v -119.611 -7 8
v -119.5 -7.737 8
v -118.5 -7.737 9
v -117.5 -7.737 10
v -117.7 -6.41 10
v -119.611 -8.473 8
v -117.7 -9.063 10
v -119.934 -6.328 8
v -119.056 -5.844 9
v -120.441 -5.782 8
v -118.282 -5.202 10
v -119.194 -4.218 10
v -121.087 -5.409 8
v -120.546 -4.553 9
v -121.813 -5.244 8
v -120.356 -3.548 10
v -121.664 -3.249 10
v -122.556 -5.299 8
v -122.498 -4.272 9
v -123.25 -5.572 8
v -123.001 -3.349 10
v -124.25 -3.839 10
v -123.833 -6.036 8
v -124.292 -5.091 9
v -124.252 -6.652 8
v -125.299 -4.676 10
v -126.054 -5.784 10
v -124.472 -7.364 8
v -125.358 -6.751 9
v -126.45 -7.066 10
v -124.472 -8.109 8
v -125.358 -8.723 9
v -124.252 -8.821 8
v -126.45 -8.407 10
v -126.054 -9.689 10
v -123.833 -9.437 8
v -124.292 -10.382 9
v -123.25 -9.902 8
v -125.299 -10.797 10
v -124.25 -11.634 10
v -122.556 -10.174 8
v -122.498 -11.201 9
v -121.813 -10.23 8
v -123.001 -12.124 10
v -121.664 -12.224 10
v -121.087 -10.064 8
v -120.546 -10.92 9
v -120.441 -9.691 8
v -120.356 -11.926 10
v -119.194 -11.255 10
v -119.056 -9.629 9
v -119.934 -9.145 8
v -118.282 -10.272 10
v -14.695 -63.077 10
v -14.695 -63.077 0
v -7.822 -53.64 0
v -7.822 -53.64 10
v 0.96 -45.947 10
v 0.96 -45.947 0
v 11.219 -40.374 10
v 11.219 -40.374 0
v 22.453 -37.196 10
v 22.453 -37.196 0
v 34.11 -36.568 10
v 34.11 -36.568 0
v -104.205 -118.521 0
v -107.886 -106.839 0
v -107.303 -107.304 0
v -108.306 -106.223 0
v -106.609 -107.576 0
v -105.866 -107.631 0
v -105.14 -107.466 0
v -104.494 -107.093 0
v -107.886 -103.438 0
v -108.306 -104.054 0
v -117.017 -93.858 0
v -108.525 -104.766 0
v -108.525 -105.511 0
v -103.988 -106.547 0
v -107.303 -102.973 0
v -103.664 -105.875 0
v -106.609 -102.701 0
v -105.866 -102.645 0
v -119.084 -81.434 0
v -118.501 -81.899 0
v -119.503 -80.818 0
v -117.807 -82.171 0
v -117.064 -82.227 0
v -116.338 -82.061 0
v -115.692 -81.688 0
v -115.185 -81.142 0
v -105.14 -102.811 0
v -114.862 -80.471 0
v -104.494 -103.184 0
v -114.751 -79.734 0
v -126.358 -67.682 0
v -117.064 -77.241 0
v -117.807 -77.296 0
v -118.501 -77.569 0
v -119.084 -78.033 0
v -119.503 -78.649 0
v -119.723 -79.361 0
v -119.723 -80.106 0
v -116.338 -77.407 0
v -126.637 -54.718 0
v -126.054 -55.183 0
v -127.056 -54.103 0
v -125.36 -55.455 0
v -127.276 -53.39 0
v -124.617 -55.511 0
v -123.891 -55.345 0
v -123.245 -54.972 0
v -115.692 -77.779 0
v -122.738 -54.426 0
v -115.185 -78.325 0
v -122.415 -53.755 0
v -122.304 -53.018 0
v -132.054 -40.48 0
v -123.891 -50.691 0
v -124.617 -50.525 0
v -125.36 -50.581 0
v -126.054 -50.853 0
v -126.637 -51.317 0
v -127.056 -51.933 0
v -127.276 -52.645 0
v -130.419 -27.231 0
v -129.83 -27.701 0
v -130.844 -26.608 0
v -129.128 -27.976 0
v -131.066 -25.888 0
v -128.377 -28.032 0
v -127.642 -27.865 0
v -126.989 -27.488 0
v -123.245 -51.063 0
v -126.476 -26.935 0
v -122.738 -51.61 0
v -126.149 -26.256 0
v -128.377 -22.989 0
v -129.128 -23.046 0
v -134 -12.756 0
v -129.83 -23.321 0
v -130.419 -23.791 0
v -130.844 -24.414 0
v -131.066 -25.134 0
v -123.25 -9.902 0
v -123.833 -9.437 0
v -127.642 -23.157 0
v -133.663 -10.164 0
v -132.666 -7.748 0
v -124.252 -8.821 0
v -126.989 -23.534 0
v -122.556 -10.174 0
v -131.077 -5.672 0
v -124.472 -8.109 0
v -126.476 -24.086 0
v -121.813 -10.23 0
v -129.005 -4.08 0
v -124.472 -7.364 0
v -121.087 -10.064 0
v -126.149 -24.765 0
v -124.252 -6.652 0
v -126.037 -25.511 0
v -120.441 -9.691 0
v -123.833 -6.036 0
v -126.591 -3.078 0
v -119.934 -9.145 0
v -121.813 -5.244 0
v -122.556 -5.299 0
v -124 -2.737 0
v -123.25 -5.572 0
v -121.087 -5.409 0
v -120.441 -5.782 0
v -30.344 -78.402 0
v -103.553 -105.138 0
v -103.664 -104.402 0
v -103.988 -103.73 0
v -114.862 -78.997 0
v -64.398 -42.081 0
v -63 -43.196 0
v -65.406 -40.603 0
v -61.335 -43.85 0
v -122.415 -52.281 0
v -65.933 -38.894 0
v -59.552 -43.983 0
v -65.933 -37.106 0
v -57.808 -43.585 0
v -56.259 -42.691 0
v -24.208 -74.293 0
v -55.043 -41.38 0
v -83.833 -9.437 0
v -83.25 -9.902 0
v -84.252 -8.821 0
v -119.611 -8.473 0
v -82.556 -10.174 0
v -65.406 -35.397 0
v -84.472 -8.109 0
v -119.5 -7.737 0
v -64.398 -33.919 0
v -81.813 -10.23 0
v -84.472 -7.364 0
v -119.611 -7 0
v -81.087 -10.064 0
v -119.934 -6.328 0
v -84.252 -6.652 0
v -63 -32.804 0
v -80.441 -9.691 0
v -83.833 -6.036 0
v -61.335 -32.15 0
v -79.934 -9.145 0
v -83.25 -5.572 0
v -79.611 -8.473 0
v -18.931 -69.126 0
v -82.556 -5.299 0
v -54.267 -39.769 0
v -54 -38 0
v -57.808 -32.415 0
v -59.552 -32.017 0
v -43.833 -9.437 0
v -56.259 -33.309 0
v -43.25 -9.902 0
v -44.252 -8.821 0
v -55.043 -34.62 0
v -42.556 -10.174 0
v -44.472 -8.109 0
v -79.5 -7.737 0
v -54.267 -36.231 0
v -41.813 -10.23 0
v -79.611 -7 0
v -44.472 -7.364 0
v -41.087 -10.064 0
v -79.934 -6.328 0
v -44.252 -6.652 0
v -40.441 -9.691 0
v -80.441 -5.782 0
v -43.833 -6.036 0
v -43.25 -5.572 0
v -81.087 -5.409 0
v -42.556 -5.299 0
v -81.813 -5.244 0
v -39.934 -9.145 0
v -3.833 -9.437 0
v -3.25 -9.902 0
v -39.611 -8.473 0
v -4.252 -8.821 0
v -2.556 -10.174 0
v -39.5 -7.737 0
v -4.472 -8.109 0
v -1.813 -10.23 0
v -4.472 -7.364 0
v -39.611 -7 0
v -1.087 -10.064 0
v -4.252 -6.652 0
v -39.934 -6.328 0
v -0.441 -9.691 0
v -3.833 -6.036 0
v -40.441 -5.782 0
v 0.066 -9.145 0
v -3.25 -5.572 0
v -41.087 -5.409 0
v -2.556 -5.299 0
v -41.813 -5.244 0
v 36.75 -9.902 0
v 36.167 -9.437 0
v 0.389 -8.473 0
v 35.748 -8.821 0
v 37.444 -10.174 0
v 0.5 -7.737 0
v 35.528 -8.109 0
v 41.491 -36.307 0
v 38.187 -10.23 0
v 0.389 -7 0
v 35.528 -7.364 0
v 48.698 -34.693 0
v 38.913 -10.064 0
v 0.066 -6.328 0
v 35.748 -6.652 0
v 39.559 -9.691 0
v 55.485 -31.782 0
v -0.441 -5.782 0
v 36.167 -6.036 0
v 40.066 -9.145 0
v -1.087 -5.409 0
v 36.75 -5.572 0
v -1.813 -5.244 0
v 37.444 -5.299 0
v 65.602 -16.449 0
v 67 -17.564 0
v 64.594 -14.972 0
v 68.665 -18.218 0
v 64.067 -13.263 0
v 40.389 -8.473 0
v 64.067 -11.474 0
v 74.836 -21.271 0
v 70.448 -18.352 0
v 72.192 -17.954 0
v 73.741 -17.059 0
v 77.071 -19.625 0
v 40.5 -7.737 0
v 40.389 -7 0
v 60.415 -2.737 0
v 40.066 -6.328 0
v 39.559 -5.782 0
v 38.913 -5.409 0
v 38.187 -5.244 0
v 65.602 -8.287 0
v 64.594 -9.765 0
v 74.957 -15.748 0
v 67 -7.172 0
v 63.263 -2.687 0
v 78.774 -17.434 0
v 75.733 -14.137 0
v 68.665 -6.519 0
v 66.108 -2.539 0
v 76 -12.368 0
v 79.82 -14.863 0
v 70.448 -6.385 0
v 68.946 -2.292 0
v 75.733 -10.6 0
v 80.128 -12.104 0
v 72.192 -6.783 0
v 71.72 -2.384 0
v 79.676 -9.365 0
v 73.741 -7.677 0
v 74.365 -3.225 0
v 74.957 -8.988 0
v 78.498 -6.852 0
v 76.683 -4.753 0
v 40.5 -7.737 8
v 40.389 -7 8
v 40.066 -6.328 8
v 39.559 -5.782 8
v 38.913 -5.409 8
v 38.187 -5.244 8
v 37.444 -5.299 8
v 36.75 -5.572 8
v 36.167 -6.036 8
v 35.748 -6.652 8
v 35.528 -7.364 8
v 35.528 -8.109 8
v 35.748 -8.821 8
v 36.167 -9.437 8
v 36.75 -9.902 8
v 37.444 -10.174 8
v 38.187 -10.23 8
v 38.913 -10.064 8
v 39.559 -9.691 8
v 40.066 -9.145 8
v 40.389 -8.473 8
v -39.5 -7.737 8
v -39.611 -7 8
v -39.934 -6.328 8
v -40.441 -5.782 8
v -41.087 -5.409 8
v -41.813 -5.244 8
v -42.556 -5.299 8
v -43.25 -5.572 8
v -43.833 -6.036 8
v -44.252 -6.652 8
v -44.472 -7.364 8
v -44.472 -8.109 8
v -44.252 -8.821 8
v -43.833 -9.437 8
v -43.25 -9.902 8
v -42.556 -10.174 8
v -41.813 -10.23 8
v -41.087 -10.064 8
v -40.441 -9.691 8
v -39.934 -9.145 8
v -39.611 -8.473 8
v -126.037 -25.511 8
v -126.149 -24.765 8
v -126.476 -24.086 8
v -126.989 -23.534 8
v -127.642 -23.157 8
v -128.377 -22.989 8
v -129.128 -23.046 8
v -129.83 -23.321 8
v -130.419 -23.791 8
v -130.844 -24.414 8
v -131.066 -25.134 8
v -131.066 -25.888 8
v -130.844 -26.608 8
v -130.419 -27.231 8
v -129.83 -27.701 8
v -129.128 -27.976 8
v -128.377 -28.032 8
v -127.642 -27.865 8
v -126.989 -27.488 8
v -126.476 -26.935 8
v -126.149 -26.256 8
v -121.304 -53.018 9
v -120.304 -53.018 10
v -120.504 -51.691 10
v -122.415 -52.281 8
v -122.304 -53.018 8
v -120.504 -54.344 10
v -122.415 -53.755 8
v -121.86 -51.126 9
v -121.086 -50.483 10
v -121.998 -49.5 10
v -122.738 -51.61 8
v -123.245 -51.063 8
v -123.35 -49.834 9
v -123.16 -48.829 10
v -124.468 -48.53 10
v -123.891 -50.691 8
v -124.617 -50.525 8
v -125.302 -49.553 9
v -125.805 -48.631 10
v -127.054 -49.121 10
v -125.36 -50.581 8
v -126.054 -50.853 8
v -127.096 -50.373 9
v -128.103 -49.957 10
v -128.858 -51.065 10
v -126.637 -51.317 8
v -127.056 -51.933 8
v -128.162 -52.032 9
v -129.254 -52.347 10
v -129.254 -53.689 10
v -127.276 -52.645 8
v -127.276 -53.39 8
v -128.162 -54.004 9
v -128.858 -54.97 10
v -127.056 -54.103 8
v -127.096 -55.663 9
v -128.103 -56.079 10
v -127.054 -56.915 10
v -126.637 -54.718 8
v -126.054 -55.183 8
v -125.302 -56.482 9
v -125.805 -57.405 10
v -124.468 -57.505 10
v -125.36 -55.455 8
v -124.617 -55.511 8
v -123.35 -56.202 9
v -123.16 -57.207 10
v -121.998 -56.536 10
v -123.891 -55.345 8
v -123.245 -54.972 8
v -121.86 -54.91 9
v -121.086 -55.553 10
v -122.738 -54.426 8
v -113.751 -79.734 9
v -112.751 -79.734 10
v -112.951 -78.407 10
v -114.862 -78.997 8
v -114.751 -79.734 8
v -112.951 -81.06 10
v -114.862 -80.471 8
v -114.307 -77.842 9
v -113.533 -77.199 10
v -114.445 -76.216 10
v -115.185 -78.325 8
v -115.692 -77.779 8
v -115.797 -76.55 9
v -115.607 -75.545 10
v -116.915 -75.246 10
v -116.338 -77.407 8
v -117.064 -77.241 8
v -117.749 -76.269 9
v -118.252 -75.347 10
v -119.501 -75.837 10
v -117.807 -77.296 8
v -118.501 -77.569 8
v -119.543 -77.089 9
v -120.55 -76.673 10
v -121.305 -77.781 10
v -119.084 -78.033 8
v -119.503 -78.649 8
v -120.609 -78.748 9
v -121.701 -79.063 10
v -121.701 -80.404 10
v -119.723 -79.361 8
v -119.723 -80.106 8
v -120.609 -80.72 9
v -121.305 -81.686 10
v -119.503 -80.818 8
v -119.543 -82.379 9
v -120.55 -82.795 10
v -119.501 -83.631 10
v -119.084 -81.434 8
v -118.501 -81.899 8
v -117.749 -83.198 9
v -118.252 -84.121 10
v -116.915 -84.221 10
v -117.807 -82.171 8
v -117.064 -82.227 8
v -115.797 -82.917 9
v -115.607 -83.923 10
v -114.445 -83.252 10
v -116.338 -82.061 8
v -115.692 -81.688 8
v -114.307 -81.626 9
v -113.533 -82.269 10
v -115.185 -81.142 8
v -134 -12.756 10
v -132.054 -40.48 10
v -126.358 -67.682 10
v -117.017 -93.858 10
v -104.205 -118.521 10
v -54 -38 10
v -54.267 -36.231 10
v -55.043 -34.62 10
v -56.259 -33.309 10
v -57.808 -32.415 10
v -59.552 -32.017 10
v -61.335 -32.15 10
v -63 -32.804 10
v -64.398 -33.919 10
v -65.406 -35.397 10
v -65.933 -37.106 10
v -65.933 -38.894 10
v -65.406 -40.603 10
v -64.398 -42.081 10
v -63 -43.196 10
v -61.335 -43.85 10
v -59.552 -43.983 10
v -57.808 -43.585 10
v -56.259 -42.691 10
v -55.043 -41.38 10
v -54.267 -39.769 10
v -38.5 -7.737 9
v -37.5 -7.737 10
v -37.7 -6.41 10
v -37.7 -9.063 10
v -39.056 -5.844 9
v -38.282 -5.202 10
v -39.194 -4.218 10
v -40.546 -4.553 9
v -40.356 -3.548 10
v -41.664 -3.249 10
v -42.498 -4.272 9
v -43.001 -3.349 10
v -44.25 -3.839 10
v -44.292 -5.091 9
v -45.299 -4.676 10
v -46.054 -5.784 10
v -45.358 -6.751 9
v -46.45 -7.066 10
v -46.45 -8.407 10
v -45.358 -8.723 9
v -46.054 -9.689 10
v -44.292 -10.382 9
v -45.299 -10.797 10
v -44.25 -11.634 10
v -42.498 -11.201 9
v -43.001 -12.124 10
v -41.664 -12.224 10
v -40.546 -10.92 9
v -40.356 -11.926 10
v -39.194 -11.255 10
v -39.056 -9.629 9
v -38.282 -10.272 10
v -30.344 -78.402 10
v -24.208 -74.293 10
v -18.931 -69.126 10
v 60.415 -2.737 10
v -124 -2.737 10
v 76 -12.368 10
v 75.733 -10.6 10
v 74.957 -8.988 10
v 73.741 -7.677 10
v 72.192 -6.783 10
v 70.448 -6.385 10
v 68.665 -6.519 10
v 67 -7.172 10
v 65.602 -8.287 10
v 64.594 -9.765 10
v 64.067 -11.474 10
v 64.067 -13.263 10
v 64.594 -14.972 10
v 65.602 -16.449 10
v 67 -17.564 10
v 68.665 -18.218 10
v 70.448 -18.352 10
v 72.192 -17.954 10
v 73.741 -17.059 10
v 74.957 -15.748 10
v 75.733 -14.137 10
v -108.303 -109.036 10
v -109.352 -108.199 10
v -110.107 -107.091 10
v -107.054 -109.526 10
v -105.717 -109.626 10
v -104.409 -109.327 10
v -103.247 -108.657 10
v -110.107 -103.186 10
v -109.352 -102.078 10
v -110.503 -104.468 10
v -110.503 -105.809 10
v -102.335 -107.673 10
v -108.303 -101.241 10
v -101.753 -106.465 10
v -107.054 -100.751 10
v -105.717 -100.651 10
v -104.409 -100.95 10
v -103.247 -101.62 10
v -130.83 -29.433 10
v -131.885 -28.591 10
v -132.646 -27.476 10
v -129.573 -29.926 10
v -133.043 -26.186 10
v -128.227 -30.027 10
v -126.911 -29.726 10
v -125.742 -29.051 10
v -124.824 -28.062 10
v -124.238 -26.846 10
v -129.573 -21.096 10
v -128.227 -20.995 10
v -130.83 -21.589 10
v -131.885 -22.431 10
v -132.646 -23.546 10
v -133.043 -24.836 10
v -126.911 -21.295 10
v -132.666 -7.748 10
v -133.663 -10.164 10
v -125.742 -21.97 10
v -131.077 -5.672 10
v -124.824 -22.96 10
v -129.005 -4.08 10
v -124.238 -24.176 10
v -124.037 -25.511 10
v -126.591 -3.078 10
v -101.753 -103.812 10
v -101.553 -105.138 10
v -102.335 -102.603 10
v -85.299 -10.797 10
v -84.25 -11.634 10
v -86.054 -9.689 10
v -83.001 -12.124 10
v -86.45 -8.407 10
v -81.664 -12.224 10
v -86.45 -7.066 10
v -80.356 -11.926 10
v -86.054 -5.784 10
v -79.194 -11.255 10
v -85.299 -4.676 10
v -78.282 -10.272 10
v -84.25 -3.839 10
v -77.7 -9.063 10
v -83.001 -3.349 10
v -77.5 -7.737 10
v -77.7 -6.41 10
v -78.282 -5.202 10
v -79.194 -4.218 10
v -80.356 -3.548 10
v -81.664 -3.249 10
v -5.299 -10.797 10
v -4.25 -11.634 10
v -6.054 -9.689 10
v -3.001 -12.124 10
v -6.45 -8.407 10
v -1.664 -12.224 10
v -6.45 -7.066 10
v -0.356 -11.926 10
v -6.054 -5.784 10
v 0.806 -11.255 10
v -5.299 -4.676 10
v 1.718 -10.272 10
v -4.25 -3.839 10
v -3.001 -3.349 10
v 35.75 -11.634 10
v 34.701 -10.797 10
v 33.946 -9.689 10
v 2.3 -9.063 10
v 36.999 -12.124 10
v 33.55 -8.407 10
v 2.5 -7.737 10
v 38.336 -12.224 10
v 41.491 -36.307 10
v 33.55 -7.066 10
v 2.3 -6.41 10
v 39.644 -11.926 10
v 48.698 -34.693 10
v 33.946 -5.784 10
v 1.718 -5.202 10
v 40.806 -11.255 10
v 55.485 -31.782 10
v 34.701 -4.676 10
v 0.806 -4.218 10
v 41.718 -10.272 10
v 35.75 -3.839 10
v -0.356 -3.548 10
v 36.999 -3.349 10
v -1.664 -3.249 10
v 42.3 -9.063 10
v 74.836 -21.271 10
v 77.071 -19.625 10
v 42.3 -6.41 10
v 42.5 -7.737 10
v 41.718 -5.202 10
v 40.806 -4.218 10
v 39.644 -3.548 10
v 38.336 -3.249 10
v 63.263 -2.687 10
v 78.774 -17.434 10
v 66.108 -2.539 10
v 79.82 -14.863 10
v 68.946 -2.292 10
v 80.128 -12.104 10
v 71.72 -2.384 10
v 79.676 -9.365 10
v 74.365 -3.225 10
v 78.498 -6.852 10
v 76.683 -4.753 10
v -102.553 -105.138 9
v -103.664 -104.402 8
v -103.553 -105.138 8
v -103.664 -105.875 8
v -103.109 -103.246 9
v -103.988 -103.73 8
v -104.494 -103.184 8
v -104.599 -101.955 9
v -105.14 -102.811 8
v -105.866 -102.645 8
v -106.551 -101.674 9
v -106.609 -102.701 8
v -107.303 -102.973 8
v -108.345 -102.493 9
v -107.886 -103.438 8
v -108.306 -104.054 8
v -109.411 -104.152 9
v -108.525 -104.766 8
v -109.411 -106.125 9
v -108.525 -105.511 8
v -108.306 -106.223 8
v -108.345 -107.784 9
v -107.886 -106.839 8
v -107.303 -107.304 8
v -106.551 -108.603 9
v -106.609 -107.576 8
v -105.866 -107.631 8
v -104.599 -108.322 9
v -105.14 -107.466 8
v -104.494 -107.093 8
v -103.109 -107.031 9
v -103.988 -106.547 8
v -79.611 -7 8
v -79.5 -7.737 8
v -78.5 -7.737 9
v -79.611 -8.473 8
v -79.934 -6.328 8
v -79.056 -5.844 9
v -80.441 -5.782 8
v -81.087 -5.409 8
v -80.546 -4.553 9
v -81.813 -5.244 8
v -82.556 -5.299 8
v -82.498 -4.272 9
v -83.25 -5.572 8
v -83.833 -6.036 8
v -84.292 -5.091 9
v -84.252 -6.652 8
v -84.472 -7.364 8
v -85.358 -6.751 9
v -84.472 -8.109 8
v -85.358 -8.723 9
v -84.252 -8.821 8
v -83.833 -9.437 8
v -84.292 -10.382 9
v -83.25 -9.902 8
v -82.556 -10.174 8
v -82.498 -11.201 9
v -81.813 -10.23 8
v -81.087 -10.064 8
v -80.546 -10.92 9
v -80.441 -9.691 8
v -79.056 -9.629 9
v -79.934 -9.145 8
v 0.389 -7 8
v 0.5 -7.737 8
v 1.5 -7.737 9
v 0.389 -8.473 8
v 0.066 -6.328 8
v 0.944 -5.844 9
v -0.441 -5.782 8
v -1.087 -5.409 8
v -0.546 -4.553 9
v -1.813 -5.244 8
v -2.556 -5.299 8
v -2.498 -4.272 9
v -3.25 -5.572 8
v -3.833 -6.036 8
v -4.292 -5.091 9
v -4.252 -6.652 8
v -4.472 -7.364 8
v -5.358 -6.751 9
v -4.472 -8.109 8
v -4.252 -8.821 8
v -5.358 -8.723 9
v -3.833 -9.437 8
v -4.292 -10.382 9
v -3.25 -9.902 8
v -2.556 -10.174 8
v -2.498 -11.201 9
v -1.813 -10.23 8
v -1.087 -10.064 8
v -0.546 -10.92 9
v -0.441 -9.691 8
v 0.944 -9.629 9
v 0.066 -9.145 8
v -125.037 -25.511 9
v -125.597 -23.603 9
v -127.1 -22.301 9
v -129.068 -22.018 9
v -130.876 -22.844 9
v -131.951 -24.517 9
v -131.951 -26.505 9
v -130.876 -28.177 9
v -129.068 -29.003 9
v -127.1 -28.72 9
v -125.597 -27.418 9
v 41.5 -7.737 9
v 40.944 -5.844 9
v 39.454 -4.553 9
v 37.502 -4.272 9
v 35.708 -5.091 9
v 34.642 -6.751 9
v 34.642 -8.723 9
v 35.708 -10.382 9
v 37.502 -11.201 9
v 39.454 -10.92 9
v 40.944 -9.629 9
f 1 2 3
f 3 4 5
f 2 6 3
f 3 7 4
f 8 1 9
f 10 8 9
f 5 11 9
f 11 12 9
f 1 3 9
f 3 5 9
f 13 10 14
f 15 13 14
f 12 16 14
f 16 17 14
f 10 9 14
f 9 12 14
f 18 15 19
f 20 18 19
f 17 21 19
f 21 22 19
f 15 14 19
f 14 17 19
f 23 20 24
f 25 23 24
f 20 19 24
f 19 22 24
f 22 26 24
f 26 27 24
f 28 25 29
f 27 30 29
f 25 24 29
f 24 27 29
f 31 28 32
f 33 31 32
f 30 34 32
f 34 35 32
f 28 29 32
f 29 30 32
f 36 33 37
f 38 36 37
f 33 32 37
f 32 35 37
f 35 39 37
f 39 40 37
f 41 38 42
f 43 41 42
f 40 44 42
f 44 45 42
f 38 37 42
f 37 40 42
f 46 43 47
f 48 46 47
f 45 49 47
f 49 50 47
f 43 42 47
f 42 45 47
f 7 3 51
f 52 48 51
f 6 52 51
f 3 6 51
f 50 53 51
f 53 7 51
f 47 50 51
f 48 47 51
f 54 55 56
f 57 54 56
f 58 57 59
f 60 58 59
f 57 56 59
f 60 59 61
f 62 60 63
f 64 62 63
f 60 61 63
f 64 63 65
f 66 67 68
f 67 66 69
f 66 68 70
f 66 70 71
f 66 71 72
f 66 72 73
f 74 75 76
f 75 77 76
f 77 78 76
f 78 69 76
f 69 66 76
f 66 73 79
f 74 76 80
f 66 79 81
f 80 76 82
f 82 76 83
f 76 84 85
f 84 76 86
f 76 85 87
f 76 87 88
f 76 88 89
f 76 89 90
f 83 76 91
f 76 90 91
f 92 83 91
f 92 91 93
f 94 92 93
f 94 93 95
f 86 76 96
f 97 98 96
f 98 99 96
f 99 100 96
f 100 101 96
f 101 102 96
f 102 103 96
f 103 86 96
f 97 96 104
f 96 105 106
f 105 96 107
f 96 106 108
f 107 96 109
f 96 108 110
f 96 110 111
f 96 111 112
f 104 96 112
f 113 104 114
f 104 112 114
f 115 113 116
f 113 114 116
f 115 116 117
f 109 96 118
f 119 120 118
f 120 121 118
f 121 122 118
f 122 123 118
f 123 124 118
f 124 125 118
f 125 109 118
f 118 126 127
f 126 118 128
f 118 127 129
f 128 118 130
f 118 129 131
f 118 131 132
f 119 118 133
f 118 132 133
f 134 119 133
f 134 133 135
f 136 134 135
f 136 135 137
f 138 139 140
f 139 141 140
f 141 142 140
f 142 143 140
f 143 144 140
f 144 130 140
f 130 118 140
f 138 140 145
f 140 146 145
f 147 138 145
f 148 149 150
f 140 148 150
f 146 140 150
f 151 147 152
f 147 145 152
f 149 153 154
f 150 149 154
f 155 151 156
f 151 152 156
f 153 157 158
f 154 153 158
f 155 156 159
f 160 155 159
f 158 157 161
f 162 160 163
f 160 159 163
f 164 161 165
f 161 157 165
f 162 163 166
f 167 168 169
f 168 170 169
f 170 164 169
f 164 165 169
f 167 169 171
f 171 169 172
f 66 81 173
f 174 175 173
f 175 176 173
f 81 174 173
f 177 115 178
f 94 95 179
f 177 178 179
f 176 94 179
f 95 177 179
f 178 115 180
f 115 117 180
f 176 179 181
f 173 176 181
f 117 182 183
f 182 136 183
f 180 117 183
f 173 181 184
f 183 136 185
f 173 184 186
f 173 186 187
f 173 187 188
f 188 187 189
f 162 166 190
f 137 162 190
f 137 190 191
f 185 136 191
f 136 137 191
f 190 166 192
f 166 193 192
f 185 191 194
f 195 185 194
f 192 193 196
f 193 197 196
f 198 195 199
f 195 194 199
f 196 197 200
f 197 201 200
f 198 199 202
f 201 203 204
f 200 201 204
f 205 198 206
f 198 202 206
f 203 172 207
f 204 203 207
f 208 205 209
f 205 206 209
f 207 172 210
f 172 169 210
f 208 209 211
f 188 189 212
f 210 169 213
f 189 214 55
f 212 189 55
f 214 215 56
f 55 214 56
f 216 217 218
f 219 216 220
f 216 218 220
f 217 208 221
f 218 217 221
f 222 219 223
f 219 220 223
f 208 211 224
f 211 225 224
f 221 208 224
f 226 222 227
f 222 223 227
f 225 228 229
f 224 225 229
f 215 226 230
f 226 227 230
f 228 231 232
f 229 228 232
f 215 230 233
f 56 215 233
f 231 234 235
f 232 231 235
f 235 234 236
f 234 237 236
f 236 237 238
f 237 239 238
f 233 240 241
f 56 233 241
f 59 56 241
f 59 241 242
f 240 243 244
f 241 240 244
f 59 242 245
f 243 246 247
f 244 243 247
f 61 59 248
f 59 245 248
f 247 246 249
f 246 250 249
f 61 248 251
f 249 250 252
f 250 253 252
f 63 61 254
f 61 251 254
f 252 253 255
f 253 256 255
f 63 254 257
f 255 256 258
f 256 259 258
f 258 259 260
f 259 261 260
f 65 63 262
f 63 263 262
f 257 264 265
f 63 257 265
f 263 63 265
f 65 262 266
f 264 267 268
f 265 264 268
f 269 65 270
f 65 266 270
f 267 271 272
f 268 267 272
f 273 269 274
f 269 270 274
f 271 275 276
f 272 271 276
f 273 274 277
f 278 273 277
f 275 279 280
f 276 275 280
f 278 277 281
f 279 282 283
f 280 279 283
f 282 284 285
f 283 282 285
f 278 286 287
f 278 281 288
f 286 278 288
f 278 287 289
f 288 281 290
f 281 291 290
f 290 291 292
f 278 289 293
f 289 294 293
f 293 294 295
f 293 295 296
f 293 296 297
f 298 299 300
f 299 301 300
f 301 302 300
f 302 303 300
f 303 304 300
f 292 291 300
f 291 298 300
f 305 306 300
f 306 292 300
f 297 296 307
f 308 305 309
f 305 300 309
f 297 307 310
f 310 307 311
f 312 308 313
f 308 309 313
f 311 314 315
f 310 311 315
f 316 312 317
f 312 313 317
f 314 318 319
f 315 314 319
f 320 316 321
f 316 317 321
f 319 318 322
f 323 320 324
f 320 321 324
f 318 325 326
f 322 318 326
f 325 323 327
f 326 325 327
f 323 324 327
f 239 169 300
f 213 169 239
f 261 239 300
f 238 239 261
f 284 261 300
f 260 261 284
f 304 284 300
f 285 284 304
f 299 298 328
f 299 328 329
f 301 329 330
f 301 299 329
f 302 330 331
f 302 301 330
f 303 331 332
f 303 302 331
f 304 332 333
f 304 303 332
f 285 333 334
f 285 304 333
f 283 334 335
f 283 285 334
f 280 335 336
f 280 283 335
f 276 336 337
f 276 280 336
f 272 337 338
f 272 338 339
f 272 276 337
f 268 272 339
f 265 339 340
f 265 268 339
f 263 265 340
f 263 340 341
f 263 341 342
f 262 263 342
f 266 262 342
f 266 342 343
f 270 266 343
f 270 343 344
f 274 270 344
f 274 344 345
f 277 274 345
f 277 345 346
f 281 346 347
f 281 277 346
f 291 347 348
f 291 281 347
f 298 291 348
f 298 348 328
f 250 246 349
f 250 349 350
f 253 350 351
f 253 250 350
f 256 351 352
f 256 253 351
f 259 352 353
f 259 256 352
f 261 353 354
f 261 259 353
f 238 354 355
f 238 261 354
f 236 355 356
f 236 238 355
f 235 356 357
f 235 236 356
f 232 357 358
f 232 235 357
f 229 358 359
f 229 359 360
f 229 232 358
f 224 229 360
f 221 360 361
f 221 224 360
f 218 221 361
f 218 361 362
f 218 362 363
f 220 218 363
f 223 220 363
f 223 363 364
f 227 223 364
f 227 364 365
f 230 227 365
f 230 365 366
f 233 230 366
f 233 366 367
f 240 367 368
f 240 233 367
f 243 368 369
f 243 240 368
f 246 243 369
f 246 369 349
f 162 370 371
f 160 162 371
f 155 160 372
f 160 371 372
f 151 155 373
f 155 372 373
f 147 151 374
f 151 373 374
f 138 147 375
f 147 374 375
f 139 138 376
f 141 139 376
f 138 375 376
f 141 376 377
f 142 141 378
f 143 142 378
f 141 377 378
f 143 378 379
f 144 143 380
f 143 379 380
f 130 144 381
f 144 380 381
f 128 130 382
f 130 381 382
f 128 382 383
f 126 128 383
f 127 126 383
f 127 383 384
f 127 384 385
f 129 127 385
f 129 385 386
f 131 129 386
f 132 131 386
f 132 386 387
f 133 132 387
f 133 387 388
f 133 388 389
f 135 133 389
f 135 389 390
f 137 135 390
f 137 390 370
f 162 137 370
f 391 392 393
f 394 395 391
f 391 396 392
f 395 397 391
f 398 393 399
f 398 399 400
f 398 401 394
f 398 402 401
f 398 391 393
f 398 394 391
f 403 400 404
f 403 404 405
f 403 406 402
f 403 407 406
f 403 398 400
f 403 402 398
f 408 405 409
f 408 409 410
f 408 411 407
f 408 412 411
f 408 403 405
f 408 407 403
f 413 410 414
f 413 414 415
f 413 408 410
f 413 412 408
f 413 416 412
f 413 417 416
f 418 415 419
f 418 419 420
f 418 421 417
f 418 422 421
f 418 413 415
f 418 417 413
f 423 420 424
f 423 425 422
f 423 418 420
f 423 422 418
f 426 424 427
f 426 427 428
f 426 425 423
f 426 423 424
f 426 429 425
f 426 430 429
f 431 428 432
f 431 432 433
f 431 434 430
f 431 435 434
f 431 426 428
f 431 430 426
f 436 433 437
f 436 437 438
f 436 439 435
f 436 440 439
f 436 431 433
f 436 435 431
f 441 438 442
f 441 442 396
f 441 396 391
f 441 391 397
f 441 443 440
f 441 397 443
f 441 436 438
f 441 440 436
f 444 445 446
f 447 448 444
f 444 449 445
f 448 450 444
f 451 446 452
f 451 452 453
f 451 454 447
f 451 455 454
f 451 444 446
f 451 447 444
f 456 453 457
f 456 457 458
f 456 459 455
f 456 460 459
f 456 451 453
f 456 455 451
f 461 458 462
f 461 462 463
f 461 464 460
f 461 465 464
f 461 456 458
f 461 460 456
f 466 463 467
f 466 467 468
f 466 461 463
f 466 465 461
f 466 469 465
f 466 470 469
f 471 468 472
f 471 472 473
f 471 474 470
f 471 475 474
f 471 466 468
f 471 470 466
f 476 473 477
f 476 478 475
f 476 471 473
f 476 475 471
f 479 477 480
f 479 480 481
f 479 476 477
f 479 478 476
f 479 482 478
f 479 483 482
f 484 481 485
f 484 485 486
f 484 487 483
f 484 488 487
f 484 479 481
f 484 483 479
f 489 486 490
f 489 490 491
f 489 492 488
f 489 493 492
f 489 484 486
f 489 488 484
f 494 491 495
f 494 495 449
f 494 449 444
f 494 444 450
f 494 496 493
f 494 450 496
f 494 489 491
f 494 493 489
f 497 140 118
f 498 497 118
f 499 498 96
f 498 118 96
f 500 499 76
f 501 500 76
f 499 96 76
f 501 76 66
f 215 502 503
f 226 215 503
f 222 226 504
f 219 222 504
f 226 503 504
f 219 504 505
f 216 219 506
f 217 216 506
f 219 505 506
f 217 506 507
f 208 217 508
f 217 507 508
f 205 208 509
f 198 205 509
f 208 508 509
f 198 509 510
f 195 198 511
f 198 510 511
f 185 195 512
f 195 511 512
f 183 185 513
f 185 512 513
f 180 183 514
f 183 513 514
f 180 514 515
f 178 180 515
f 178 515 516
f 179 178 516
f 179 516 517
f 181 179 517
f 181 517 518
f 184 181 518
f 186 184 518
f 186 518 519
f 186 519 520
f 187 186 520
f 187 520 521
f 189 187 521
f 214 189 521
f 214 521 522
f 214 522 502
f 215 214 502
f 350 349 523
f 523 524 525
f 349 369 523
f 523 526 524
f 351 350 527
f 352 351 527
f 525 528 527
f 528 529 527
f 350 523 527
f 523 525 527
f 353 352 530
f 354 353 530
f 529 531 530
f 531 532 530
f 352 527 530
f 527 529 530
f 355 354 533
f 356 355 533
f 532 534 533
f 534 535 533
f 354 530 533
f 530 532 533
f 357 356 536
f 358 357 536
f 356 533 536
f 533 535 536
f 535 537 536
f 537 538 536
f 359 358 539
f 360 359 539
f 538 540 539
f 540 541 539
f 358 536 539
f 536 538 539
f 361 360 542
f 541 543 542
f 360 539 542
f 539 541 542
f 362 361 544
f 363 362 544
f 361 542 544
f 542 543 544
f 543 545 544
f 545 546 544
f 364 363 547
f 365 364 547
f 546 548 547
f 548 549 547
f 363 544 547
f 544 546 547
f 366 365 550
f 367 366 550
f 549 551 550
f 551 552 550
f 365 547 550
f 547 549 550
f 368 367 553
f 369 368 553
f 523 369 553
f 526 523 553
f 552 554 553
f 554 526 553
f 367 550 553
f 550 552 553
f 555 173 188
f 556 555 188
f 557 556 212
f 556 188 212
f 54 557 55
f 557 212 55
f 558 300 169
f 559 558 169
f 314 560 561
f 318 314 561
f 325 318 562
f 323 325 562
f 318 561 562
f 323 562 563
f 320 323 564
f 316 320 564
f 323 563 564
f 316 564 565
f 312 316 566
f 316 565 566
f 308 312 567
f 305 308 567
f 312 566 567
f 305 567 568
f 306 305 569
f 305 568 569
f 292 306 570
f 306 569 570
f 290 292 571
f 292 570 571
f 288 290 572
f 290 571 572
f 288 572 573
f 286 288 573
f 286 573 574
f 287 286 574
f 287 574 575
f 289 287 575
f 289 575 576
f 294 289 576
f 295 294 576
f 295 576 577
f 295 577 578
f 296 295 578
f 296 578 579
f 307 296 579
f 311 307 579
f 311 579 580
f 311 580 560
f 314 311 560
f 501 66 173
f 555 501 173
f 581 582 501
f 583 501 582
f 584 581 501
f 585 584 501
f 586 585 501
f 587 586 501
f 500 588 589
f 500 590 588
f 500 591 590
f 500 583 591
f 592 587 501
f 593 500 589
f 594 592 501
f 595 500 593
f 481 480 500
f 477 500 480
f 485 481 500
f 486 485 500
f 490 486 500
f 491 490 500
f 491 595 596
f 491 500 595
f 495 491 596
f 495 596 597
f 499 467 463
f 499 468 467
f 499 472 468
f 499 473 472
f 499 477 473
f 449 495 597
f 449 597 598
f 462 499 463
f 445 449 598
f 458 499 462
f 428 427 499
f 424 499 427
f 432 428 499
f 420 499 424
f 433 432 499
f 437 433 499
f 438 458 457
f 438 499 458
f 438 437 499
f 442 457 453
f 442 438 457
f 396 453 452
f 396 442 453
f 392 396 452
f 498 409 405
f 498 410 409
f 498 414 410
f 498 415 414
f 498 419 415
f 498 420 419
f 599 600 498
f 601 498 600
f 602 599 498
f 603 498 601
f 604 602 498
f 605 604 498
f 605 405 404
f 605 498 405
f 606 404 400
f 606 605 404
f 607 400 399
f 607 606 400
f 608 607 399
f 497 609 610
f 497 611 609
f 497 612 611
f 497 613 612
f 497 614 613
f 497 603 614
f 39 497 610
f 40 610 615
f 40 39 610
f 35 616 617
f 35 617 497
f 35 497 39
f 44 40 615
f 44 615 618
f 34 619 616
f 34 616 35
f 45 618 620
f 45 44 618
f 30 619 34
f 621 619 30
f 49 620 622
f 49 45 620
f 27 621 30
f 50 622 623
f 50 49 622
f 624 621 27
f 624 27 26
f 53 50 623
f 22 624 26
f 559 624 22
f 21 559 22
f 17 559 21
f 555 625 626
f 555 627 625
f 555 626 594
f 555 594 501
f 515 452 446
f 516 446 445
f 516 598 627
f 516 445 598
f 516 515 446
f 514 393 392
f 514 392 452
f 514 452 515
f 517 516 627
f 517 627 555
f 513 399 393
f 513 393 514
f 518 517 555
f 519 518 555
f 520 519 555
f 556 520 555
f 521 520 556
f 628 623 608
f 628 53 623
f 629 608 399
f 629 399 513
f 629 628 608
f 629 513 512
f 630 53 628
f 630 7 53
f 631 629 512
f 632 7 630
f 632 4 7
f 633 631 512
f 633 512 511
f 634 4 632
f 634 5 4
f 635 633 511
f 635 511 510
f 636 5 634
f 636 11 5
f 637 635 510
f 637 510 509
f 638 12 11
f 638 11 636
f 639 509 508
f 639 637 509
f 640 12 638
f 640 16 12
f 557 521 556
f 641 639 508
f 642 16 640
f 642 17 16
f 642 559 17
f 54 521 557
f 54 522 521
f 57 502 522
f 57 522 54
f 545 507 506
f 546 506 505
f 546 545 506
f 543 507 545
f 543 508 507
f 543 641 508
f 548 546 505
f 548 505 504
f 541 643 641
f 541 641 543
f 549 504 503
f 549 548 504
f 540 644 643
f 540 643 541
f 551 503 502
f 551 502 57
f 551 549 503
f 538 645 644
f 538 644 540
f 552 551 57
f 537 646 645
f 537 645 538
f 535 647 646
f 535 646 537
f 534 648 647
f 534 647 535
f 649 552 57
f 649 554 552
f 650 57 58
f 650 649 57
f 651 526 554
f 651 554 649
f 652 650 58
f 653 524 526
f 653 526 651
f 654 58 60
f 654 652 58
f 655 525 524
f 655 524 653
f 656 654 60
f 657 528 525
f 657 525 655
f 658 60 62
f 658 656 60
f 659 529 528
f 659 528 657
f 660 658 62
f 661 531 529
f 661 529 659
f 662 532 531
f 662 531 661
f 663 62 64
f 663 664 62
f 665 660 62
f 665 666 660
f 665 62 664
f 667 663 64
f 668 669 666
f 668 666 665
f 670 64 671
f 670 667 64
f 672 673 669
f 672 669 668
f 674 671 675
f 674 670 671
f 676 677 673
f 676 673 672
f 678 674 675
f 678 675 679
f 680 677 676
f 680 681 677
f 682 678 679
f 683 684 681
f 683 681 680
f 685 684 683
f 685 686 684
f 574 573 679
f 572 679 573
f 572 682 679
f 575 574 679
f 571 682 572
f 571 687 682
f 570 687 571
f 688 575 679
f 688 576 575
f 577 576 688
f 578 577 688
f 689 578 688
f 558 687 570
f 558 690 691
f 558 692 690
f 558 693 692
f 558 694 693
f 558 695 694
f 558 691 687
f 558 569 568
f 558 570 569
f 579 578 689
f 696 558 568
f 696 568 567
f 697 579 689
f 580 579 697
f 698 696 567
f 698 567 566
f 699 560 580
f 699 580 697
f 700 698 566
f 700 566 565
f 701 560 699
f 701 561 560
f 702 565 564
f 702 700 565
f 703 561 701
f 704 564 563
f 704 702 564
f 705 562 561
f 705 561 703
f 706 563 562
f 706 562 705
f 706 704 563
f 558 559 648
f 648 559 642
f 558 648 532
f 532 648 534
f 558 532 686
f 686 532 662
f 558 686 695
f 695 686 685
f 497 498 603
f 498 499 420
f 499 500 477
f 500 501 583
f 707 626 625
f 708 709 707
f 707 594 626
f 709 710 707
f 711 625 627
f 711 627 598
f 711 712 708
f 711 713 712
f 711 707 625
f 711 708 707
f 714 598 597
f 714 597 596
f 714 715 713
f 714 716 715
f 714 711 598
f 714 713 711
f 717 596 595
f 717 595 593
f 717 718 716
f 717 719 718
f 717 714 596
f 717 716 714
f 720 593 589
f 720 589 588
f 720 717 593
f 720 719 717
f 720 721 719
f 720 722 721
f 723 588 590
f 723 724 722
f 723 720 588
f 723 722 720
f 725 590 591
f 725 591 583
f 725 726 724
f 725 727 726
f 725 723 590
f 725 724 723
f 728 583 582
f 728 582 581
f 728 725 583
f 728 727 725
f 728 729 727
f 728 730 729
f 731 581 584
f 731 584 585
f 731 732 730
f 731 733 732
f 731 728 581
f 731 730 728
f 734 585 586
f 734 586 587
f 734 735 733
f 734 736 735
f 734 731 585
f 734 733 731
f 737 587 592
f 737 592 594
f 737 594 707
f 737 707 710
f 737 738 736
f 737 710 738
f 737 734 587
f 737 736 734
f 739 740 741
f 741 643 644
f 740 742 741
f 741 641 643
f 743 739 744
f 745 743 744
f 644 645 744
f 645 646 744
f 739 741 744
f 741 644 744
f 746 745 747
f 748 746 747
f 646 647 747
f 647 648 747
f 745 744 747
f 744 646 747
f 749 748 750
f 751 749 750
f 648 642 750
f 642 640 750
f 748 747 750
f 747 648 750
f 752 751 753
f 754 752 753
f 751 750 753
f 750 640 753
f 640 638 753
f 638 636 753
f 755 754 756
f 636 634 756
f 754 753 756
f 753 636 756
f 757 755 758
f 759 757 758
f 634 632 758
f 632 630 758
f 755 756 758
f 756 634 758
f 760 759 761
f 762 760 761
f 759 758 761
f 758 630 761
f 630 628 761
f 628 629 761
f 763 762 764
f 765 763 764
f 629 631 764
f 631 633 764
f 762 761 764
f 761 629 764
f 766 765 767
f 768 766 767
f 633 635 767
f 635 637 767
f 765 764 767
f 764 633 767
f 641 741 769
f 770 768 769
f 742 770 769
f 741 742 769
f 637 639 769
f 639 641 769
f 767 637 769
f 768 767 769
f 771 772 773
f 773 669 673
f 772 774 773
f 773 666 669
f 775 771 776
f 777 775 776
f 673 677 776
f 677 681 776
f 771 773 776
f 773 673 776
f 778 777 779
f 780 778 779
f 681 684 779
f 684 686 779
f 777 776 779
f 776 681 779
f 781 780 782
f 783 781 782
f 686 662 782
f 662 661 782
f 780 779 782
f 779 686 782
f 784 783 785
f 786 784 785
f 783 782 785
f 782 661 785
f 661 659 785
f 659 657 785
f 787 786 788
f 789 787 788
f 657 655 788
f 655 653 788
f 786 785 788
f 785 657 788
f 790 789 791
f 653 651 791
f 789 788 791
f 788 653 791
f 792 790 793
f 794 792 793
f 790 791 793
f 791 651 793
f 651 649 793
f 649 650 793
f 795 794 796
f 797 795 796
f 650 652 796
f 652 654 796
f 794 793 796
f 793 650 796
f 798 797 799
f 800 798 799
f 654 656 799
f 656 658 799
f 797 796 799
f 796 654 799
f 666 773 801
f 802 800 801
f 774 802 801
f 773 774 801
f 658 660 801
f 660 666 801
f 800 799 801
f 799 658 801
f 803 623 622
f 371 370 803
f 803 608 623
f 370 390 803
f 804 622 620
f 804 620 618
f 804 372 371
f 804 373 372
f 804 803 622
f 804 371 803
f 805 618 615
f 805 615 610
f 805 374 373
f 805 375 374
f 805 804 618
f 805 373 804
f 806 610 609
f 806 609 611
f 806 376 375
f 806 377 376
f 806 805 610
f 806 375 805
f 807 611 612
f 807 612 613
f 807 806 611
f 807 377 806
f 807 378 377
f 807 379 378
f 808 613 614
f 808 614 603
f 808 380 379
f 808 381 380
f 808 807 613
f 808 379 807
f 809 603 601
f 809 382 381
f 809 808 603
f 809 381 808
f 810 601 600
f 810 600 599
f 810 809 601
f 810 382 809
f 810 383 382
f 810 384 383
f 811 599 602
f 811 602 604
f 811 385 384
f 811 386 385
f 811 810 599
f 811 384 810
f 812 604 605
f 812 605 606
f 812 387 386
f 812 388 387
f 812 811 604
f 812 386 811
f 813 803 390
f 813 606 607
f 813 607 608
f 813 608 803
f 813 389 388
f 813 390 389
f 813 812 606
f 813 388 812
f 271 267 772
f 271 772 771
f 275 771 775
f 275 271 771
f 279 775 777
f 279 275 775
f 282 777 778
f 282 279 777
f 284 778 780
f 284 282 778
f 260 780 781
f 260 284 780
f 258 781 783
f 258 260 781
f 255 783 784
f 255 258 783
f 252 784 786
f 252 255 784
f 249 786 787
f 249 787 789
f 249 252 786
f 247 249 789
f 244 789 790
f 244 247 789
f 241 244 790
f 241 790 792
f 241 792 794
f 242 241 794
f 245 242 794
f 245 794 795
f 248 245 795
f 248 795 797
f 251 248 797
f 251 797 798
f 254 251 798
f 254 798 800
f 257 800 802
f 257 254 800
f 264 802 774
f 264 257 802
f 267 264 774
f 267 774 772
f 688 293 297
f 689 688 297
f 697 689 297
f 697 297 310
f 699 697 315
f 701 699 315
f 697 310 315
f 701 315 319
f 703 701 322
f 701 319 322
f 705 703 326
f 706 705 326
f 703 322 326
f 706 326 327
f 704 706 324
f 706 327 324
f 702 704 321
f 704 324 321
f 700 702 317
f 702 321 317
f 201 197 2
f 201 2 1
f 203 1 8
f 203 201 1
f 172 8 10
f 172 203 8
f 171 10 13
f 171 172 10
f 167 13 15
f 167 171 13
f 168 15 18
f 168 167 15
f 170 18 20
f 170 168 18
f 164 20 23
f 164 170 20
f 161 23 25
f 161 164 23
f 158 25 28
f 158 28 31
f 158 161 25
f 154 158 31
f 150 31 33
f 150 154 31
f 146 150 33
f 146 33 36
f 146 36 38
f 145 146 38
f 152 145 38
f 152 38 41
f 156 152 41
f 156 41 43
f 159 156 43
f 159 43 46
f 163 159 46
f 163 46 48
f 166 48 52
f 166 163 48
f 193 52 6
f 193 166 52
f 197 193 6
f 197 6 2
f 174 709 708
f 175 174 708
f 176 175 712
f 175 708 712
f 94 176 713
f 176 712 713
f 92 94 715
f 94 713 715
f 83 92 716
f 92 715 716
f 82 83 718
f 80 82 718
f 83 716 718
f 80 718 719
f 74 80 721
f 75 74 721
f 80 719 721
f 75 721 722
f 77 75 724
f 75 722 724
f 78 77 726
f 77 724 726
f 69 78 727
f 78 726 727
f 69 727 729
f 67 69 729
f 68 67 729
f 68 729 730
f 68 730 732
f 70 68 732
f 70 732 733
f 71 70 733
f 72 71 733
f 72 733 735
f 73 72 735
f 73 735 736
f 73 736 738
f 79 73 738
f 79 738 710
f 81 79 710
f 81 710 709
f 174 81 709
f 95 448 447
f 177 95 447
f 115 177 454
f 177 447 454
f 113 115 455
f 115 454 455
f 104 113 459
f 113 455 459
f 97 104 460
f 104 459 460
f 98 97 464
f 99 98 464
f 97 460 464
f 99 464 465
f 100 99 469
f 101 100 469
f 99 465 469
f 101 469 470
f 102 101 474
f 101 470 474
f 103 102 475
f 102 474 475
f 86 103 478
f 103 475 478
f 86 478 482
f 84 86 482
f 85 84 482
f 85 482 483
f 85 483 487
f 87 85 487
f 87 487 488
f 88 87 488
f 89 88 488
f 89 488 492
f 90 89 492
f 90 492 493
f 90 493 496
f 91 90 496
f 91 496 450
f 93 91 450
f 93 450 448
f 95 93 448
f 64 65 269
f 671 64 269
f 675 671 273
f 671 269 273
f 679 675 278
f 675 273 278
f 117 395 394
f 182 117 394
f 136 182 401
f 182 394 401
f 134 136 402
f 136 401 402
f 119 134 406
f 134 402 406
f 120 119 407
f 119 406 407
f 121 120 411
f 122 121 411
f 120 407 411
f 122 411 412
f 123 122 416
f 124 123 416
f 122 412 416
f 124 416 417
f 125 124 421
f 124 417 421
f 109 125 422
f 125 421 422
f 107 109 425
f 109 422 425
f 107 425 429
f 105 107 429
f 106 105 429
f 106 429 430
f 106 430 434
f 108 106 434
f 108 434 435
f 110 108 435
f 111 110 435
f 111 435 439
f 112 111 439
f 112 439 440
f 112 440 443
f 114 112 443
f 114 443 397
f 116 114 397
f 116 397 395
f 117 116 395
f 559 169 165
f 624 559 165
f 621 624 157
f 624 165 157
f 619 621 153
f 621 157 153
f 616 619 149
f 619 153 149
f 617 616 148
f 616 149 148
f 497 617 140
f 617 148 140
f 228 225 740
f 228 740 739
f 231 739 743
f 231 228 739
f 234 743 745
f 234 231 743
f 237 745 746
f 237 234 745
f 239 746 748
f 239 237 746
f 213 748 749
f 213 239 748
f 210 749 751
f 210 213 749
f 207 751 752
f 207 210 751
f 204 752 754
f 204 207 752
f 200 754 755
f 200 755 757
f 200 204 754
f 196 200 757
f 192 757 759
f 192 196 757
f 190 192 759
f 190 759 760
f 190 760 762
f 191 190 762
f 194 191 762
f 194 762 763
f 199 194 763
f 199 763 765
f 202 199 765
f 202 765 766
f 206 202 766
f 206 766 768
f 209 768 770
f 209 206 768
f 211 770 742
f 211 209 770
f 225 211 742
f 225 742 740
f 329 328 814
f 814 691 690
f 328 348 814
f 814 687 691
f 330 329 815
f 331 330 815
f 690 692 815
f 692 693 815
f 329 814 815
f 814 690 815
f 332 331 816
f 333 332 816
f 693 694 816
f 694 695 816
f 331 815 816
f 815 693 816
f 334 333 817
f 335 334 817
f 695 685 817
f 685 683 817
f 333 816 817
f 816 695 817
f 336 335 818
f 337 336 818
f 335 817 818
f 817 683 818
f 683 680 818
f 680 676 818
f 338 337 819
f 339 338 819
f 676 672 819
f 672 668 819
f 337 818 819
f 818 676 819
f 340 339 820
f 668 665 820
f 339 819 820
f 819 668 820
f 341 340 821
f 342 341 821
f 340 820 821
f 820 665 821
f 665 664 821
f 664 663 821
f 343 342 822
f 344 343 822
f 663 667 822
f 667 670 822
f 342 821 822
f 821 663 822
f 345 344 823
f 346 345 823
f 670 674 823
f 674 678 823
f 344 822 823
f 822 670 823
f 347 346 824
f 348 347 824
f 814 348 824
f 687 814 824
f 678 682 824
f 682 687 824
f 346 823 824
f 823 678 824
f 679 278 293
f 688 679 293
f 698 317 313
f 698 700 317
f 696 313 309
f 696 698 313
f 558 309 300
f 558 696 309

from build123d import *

# Parameters (mm, degrees)
SKETCH1_R           = 2.5
BOSS_EXTRUDE1_DEPTH = 10
CHAMFER1_SIZE       = 2
SKETCH2_R           = 6
CUT_EXTRUDE1_DEPTH  = 48
SKETCH3_R           = 6
CUT_EXTRUDE2_DEPTH  = 14
SKETCH4_R           = 2.528531427
SKETCH4_R_2         = 2.5
CUT_EXTRUDE3_DEPTH  = 14
CHAMFER2_SIZE       = 2
FILLET1_R           = 82


with BuildPart() as part:
    # Sketch1 → Boss-Extrude1 (new body)
    with BuildSketch(Plane.XY):
        with BuildLine():
            Line((55.484867262, -31.782339645), (74.83591229, -21.271406043))
            ThreePointArc((74.83591229, -21.271406043), (79.305955572, -8.361988007), (66.856482862, -2.7366))
            Line((66.856482862, -2.7366), (-123.999650399, -2.7366))
            ThreePointArc((-123.999650399, -2.7366), (-131.077427076, -5.672247424), (-133.999632379, -12.755584536))
            ThreePointArc((-133.999632379, -12.755584536), (-126.357727013, -67.682340192), (-104.205340418, -118.521488224))
            Line((-104.205340418, -118.521488224), (-30.34426595, -78.402267355))
            ThreePointArc((-30.34426595, -78.402267355), (-21.450076132, -71.83180545), (-14.694704232, -63.077233349))
            ThreePointArc((-14.694704232, -63.077233349), (5.93460242, -42.875720255), (34.110442904, -36.567674809))
            ThreePointArc((34.110442904, -36.567674809), (45.131584541, -35.666553732), (55.484867262, -31.782339645))
        make_face()
        with Locations((-122, -7.7366)):
            Circle(SKETCH1_R, mode=Mode.SUBTRACT)
        with Locations((-82, -7.7366)):
            Circle(SKETCH1_R, mode=Mode.SUBTRACT)
        with Locations((-42, -7.7366)):
            Circle(SKETCH1_R, mode=Mode.SUBTRACT)
        with Locations((-2, -7.7366)):
            Circle(SKETCH1_R, mode=Mode.SUBTRACT)
        with Locations((38, -7.7366)):
            Circle(SKETCH1_R, mode=Mode.SUBTRACT)
    extrude(amount=BOSS_EXTRUDE1_DEPTH)

    # Chamfer1
    chamfer1_edges = [part.edges().sort_by_distance(p)[0] for p in [
        (-124.5, -7.7366, 10),
        (-84.5, -7.7366, 10),
        (-44.5, -7.7366, 10),
        (-4.5, -7.7366, 10),
        (35.5, -7.7366, 10),
    ]]
    chamfer(chamfer1_edges, length=CHAMFER1_SIZE)

    # Sketch2 → Cut-Extrude1 (cut)
    with BuildSketch(Plane.XY.offset(10)):
        with Locations((70, -12.3683)):
            Circle(SKETCH2_R)
    extrude(amount=-CUT_EXTRUDE1_DEPTH, mode=Mode.SUBTRACT)

    # Sketch3 → Cut-Extrude2 (cut)
    with BuildSketch(Plane.XY.offset(10)):
        with Locations((-60, -38)):
            Circle(SKETCH3_R)
    extrude(amount=-CUT_EXTRUDE2_DEPTH, mode=Mode.SUBTRACT)

    # Sketch4 → Cut-Extrude3 (cut)
    with BuildSketch(Plane.XY.offset(10)):
        with Locations((-128.565543545, -25.510785173)):
            Circle(SKETCH4_R)
        with Locations((-124.80403691, -53.01786585)):
            Circle(SKETCH4_R_2)
        with Locations((-117.250891281, -79.733748965)):
            Circle(SKETCH4_R_2)
        with Locations((-106.053120049, -105.138440244)):
            Circle(SKETCH4_R_2)
    extrude(amount=-CUT_EXTRUDE3_DEPTH, mode=Mode.SUBTRACT)

    # Chamfer2
    chamfer2_edges = [part.edges().sort_by_distance(p)[0] for p in [
        (-131.094074972, -25.510785173, 10),
        (-127.30403691, -53.01786585, 10),
        (-119.750891281, -79.733748965, 10),
        (-108.553120049, -105.138440244, 10),
    ]]
    chamfer(chamfer2_edges, length=CHAMFER2_SIZE)

    # Fillet1
    fillet1_edges = [part.edges().sort_by_distance(p)[0] for p in [
        (66.856482862, -2.7366, 5),
    ]]
    fillet(fillet1_edges, radius=FILLET1_R)


solid = part.part
